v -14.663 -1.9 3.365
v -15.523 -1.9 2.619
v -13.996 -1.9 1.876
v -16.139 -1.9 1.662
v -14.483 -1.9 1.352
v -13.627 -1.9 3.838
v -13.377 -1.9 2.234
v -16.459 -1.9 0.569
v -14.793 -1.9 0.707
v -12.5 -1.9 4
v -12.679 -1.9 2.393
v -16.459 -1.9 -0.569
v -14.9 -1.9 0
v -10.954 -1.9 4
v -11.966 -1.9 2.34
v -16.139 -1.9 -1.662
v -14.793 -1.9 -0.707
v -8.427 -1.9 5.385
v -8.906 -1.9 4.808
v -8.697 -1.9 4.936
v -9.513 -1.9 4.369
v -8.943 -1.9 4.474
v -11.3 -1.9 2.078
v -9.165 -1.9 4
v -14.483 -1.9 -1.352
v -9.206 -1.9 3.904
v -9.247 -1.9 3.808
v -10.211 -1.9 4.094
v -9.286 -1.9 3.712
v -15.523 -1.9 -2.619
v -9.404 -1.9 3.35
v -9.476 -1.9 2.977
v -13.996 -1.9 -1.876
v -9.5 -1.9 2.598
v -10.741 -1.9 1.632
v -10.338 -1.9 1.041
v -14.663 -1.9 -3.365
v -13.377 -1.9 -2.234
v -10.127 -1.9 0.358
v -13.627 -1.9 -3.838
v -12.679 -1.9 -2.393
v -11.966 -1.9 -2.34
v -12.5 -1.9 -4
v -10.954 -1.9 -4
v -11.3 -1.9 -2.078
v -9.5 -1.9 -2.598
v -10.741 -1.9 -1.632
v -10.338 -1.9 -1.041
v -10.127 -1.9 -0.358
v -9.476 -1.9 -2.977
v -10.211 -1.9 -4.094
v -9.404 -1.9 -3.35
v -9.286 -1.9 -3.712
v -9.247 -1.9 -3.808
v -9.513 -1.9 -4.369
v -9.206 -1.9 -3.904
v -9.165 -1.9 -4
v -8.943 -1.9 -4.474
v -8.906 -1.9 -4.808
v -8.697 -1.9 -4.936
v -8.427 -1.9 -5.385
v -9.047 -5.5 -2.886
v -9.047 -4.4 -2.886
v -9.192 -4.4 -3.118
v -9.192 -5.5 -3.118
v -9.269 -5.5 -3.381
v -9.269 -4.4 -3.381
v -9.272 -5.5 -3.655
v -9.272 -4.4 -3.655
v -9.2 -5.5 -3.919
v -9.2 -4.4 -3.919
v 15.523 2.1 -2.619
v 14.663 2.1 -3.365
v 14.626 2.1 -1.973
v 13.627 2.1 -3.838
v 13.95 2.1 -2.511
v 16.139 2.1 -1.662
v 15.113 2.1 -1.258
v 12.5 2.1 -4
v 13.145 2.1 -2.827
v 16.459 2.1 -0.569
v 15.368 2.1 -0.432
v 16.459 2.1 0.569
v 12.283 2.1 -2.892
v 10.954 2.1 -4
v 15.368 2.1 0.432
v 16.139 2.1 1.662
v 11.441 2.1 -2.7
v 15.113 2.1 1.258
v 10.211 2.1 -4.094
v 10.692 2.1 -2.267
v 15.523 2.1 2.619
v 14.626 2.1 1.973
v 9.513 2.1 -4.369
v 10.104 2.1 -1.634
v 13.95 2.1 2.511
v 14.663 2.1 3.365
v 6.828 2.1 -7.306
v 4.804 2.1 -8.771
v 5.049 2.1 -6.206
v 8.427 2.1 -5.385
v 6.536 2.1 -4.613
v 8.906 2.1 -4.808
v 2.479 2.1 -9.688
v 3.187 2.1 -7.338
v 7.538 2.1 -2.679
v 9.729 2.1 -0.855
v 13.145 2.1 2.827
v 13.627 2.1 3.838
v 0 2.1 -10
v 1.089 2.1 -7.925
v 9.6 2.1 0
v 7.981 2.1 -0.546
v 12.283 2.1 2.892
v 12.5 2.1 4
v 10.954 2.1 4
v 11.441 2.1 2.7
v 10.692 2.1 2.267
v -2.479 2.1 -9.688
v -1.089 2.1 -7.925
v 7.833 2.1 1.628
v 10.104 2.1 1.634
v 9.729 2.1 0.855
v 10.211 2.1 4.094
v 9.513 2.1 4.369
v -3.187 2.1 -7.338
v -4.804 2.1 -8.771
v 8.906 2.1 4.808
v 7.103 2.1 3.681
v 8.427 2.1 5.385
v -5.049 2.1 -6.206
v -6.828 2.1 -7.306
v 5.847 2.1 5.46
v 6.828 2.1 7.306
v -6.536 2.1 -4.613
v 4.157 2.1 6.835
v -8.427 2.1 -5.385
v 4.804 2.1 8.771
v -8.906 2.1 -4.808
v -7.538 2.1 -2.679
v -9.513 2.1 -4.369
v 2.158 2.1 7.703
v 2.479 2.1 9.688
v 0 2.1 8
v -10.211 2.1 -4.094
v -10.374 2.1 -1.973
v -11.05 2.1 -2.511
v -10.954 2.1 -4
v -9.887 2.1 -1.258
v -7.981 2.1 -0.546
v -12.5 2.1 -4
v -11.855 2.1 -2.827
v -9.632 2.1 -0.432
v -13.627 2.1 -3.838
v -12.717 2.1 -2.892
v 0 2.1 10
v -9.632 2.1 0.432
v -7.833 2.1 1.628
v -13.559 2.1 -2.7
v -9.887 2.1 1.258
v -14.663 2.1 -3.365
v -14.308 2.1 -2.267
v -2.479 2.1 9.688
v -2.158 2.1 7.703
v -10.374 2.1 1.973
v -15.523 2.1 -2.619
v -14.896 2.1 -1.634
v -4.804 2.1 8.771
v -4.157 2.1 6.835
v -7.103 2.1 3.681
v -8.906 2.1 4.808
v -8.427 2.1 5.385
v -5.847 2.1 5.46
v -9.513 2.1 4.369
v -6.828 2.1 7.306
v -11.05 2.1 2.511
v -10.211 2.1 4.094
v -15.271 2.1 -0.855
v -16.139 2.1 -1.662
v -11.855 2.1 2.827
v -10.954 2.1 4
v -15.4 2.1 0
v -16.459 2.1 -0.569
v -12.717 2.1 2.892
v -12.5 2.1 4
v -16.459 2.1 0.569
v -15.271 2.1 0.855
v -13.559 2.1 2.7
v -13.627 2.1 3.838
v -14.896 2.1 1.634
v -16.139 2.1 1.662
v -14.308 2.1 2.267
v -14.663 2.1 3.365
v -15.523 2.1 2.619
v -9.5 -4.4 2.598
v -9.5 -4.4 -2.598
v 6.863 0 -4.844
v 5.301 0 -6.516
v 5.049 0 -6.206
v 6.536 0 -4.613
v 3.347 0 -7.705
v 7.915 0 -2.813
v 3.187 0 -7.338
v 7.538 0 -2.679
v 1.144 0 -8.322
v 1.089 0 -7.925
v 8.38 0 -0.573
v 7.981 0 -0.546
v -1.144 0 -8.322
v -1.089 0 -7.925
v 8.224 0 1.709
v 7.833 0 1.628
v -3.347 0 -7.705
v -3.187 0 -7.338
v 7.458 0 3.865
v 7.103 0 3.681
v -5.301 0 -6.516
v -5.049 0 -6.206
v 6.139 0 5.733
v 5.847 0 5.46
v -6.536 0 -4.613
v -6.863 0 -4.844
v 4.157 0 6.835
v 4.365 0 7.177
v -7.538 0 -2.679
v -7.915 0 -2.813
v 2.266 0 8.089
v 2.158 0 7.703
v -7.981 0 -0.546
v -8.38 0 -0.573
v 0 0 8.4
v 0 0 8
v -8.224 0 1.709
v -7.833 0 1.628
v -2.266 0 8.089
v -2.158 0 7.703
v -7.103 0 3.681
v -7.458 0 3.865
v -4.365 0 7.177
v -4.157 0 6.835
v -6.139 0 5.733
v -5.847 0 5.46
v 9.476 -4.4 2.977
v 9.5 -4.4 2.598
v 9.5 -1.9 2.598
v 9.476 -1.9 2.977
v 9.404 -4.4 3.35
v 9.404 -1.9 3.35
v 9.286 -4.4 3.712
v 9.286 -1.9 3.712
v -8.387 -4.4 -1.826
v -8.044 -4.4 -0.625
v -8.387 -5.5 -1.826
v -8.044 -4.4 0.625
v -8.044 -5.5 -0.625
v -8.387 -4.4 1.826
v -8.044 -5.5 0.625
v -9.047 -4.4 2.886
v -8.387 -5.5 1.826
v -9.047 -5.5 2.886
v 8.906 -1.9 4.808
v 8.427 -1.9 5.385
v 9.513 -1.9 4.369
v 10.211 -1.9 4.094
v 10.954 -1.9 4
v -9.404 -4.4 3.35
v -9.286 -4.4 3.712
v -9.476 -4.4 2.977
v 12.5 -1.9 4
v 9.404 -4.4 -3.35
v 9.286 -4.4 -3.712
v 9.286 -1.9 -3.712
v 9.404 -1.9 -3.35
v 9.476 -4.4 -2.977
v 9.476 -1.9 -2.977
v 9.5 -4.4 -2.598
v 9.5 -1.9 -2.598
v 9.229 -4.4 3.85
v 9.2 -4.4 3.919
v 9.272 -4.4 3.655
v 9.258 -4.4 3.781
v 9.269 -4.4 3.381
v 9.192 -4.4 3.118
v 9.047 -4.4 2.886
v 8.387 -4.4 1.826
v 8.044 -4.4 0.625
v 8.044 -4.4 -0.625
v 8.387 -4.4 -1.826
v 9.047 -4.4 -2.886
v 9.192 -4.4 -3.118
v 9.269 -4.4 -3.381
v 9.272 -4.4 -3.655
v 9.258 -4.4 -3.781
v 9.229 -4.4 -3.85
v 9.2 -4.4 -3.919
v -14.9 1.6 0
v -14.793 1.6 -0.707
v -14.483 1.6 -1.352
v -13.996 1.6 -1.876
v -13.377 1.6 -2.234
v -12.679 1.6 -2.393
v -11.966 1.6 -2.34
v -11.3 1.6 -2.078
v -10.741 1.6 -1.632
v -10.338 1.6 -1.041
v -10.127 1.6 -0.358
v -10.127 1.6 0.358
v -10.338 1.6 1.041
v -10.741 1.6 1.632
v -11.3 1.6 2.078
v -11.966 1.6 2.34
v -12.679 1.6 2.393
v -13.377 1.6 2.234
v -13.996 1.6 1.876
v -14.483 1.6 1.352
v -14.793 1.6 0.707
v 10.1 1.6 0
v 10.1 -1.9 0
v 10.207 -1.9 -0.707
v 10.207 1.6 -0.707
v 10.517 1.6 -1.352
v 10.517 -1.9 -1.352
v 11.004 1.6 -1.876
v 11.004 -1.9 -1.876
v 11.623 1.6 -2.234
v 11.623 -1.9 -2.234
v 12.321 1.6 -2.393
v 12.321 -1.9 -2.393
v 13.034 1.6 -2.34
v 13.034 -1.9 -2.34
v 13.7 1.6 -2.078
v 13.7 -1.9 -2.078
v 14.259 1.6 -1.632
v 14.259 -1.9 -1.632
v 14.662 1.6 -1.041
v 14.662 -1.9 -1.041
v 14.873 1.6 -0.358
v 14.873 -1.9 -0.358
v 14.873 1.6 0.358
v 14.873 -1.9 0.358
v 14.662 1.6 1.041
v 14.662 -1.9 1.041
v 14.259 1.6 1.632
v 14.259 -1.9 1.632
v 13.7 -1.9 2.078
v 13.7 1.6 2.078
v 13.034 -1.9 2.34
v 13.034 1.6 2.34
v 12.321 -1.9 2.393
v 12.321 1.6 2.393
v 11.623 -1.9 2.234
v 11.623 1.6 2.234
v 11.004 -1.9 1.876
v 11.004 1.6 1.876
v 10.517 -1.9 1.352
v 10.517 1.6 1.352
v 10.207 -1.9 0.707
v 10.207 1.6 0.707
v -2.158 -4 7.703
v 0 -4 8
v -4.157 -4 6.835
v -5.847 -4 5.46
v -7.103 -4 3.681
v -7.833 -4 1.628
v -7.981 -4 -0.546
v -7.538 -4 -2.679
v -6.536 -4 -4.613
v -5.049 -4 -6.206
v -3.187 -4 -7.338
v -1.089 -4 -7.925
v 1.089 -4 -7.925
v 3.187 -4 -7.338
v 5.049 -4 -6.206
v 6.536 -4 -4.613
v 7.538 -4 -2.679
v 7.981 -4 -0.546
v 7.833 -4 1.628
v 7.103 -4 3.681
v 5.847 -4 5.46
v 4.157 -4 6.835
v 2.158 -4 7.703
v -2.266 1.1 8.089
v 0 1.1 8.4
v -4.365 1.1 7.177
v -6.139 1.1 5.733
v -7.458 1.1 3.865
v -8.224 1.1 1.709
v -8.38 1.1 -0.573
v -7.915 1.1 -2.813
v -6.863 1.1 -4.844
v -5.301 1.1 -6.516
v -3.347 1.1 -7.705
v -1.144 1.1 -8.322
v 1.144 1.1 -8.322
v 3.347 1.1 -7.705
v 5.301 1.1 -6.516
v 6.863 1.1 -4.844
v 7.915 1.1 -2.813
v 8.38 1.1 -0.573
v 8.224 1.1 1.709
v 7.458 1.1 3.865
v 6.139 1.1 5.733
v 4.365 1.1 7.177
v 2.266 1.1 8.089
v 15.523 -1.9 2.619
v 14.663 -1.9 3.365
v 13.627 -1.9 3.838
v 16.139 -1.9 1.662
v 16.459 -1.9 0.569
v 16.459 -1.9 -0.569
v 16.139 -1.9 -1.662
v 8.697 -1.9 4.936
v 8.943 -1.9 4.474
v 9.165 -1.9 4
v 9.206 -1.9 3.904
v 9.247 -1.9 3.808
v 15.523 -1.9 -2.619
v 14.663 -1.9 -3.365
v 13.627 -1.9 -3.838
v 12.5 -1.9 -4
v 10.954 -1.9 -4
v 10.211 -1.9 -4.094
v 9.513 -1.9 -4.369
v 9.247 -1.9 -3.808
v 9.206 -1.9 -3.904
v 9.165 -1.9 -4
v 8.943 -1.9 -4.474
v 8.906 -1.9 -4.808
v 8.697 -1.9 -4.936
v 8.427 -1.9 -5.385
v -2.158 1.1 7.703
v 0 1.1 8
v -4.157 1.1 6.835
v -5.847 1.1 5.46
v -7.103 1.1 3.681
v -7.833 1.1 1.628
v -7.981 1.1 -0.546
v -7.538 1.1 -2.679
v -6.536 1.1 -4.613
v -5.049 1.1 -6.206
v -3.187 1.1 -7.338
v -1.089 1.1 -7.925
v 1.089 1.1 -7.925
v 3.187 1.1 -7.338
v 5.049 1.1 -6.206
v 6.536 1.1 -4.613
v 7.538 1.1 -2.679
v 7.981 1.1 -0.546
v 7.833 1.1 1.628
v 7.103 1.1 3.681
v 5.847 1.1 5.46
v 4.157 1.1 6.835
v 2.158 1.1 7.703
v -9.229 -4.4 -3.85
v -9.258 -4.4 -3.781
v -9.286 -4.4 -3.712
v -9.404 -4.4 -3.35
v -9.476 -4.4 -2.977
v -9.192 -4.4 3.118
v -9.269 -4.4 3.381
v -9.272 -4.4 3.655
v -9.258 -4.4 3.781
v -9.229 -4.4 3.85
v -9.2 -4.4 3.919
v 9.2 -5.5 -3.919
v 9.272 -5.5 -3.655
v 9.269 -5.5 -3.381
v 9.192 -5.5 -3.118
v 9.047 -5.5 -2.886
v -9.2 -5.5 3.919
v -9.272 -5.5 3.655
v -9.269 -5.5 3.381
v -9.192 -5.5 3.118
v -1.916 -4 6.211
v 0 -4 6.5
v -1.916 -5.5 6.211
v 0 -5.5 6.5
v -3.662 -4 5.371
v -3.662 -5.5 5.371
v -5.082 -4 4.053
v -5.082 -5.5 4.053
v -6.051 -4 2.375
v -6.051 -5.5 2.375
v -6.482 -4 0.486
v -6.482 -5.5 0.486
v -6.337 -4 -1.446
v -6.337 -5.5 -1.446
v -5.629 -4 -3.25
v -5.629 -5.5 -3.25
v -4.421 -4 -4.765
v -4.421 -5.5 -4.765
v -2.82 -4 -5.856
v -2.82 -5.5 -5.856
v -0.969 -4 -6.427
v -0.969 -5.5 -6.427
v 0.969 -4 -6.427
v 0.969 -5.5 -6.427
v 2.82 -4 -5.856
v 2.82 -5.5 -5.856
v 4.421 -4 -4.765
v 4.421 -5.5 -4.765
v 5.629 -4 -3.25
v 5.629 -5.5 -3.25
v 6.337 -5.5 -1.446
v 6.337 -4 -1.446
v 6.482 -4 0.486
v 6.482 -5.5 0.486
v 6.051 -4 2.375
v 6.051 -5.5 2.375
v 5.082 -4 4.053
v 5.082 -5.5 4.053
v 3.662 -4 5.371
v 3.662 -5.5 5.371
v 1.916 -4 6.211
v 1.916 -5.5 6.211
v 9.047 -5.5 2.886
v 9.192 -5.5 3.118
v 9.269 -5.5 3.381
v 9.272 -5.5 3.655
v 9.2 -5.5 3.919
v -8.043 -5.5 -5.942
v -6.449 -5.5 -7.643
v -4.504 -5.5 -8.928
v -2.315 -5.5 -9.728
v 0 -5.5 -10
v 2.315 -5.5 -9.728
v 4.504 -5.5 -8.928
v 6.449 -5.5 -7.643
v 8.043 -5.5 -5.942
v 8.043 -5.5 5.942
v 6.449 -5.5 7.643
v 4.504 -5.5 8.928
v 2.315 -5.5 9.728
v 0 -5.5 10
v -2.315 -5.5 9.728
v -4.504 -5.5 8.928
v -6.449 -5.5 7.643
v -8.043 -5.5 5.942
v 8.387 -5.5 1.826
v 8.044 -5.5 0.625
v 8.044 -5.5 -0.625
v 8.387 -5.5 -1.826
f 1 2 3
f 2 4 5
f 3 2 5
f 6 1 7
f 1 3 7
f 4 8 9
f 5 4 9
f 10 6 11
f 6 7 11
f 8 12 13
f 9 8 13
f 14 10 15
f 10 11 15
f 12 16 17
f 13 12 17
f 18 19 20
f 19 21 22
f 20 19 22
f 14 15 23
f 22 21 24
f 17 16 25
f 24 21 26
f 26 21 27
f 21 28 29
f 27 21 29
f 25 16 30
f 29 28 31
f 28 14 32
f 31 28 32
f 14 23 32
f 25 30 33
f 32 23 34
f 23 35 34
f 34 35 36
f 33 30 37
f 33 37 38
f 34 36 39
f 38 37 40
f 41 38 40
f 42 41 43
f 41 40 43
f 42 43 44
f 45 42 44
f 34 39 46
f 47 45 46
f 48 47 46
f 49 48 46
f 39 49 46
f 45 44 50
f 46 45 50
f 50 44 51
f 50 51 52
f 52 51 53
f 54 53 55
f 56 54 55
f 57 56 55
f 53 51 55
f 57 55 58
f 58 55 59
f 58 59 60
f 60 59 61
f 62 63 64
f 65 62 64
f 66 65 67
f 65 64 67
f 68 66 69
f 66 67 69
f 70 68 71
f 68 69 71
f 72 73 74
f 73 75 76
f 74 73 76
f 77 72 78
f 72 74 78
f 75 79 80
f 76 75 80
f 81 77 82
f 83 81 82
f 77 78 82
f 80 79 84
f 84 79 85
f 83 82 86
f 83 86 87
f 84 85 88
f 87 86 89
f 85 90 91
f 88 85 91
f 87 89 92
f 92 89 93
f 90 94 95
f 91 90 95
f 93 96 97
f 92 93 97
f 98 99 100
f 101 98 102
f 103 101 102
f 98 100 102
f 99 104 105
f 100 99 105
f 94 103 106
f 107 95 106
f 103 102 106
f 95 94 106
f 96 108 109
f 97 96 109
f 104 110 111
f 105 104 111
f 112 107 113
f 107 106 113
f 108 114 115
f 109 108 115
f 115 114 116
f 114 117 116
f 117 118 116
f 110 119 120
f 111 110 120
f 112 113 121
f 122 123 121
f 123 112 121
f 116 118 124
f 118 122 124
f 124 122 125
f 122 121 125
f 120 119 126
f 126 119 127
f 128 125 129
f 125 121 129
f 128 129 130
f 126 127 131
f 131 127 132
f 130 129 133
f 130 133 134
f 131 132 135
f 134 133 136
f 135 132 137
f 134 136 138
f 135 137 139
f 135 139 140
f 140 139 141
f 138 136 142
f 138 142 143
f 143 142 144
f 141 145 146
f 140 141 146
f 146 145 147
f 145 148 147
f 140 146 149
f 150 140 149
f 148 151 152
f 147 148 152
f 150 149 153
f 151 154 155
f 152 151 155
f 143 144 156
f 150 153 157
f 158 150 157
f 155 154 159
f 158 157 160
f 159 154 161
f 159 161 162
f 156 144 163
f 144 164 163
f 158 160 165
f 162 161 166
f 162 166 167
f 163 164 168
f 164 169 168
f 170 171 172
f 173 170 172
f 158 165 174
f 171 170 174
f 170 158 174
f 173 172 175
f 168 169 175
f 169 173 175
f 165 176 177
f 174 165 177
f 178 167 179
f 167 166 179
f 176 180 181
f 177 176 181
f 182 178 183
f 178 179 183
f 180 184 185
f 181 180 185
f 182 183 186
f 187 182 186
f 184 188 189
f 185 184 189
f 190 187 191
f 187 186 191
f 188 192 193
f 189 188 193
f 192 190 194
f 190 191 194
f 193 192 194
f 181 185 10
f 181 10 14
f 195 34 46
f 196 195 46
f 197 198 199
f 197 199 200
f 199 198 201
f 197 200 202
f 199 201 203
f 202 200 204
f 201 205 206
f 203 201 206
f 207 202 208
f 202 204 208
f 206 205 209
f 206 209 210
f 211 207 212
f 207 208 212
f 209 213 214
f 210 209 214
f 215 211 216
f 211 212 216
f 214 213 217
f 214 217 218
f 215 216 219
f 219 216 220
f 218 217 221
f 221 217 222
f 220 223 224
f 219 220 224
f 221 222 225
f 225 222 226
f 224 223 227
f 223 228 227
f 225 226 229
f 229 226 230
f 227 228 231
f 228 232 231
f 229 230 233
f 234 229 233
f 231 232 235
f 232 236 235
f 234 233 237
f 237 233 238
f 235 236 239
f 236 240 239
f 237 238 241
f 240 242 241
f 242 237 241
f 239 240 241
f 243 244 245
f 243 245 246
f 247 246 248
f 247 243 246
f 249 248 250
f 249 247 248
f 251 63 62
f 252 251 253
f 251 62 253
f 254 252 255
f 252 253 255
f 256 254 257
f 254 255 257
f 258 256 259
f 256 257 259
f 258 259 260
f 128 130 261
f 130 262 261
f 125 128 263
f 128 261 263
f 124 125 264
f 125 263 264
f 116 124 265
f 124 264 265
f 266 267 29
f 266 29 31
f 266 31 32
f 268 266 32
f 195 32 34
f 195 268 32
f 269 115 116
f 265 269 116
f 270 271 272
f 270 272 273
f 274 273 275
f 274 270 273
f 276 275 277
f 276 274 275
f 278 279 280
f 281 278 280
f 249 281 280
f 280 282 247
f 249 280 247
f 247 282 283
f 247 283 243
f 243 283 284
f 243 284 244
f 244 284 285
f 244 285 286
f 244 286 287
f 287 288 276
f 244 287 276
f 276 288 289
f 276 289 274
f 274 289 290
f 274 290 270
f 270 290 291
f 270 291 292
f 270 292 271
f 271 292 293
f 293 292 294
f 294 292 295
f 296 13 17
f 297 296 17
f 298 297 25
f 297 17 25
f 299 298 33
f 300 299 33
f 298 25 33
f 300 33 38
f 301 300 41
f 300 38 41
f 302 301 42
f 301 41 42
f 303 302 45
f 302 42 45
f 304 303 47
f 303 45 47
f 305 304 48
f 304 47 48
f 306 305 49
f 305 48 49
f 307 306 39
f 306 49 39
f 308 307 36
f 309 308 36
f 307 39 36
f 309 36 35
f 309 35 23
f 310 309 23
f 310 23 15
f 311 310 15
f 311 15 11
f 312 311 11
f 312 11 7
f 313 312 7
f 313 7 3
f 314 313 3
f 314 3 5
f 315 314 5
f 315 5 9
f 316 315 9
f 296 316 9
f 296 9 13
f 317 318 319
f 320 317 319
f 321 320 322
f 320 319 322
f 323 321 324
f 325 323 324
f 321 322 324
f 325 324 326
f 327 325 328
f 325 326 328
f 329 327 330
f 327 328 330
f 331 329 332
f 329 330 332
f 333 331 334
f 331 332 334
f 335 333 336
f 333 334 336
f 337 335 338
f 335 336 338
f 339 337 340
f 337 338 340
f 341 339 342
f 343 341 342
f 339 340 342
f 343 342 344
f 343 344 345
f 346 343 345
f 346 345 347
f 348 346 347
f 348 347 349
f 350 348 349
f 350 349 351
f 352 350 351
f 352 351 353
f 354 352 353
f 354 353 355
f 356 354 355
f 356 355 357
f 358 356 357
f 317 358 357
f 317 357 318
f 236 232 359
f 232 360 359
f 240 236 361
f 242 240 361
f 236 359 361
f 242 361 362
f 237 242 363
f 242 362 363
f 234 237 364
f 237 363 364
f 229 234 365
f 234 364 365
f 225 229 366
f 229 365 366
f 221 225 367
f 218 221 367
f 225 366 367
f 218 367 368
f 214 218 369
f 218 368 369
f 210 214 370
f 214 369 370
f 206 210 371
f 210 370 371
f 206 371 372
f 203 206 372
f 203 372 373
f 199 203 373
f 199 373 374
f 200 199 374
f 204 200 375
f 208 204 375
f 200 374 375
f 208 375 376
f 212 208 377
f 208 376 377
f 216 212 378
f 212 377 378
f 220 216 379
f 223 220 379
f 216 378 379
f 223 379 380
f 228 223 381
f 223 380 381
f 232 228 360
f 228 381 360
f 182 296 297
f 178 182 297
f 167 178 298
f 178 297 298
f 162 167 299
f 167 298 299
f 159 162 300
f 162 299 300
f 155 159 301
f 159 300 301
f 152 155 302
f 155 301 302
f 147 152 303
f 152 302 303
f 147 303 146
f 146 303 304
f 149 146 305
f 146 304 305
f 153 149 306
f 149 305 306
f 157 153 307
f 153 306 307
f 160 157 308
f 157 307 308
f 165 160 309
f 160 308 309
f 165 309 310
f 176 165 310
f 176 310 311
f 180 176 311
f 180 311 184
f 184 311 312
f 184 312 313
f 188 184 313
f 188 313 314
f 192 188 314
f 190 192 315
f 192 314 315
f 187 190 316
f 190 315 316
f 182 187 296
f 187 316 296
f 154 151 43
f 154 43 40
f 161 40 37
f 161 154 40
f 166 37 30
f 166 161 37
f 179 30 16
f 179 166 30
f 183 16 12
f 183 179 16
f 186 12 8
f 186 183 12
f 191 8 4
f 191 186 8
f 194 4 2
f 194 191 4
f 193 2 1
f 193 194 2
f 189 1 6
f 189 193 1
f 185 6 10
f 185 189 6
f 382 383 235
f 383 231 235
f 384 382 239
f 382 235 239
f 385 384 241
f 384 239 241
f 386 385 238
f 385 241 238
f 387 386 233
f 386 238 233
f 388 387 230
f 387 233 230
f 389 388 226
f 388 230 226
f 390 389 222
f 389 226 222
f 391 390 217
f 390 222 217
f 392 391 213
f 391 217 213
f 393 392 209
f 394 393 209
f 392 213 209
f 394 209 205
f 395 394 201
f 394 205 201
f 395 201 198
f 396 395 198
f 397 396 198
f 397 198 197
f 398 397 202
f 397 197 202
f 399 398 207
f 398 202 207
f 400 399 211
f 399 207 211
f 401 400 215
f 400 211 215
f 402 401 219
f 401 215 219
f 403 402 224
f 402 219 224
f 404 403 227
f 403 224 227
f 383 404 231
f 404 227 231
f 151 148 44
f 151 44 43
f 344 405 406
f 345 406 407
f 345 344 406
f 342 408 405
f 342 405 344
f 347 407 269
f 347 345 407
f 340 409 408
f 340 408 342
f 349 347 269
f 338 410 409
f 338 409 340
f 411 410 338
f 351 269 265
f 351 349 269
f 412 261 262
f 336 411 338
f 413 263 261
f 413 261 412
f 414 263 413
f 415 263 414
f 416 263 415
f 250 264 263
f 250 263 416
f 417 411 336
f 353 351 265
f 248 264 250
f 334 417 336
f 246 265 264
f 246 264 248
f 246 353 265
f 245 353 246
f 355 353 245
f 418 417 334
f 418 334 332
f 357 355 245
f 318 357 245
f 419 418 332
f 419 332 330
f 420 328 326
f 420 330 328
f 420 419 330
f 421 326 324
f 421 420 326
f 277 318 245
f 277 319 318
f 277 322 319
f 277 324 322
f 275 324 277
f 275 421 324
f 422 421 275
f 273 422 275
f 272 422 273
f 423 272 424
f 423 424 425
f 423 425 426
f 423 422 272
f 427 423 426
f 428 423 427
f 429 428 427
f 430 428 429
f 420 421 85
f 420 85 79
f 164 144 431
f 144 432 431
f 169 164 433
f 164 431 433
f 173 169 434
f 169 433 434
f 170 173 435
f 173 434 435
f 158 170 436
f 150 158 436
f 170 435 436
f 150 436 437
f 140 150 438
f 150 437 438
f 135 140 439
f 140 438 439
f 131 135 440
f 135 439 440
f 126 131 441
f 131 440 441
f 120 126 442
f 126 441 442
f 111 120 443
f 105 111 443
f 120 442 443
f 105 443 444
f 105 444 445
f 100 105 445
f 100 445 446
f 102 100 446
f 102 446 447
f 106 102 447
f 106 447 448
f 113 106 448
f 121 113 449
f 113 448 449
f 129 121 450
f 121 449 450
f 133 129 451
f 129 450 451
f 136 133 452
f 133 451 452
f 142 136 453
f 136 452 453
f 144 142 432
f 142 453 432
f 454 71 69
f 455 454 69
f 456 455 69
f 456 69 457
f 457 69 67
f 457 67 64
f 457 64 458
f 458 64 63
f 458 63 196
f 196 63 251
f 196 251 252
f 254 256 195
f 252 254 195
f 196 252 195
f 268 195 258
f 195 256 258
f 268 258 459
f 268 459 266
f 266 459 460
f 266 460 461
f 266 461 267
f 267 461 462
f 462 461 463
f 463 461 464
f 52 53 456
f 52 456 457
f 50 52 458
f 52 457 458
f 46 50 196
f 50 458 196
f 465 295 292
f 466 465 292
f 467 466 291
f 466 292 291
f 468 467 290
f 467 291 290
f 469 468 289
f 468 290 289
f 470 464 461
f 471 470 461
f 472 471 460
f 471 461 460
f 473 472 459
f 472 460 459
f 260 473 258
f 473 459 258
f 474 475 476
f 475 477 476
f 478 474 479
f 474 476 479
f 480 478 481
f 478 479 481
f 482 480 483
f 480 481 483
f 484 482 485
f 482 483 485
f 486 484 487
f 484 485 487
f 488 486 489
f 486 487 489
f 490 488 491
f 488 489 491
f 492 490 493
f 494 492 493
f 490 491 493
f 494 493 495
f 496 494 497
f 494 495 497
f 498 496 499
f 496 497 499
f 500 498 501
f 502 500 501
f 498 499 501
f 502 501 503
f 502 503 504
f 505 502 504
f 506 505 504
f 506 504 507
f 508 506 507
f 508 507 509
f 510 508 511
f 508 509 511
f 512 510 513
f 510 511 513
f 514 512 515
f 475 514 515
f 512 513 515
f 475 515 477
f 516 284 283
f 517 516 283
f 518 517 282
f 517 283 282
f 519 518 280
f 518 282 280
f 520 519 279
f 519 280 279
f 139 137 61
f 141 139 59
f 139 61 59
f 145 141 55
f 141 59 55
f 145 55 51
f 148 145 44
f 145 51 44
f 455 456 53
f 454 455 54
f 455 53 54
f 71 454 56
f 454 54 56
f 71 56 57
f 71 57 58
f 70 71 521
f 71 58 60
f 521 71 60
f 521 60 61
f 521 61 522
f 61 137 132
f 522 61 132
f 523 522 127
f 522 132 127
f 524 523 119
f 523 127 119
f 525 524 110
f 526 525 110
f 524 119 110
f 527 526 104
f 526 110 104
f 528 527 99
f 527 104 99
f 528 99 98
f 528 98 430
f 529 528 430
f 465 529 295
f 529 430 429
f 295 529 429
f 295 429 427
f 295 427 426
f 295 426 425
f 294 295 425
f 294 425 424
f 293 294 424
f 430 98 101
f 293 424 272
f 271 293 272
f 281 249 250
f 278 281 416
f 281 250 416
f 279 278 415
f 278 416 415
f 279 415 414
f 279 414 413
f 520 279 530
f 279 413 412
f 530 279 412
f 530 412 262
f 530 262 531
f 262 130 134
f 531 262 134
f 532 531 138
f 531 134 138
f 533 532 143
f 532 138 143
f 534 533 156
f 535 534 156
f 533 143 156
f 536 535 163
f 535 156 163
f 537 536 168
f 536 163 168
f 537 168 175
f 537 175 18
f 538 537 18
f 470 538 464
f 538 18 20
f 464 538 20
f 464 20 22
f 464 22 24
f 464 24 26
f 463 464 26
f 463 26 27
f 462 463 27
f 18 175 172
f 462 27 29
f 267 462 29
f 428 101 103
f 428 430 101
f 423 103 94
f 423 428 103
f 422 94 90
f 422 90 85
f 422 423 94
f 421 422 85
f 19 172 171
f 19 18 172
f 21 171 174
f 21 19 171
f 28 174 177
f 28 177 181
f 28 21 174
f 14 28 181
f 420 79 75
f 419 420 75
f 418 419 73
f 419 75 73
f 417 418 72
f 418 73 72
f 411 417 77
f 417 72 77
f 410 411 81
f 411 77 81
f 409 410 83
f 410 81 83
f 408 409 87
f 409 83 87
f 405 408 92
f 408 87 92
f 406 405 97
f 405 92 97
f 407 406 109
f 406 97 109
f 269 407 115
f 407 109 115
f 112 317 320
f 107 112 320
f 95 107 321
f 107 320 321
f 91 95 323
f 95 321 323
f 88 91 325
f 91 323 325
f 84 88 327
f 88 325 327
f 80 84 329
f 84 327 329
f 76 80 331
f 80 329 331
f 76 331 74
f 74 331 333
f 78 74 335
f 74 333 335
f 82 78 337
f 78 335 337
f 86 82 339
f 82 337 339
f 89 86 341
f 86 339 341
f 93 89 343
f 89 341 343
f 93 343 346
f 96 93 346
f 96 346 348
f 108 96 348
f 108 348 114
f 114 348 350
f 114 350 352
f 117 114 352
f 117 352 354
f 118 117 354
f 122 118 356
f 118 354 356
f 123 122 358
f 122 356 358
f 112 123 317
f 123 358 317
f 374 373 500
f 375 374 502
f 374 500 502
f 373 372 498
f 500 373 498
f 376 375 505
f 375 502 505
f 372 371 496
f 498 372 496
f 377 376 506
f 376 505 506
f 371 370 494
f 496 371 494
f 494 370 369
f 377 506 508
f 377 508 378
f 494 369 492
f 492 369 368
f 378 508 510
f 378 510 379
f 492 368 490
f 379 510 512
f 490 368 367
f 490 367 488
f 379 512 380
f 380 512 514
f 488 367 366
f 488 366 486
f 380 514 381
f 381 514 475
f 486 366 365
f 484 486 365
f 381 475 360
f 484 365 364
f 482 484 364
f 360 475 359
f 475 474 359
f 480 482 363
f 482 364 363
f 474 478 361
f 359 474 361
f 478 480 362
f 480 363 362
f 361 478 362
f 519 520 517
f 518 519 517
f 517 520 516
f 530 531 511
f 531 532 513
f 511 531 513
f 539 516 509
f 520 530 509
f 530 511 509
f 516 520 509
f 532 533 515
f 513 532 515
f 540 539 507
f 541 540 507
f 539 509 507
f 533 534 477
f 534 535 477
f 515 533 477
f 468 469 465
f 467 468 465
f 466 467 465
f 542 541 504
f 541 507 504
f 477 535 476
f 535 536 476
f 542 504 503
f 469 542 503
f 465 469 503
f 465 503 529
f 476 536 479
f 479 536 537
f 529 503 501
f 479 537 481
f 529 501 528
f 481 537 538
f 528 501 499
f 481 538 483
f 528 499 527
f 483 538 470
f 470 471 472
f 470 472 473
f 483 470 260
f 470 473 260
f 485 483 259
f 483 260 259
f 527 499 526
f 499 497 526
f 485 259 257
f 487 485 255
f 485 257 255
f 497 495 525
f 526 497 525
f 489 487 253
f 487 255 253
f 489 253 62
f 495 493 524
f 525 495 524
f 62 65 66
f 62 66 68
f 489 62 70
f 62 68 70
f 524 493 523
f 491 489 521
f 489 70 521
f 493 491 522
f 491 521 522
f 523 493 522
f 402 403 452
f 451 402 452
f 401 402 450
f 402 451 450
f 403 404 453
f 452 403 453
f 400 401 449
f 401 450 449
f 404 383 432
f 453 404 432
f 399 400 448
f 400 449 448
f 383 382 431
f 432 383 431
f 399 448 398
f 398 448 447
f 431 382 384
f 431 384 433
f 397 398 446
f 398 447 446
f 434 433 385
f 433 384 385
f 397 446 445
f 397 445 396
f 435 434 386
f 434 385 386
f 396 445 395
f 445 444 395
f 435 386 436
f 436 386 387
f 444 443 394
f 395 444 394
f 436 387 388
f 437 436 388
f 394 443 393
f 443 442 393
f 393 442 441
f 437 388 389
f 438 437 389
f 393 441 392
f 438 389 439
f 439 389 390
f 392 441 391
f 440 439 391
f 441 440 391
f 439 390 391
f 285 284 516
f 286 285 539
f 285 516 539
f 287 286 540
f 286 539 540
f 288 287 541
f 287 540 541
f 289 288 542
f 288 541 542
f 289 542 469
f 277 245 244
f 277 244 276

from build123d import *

# Parameters (mm, degrees)
BOSS_EXTRU_1_DEPTH             = 4
ENL_V_START                    = -4
ENL_V_MAT_EXTRU_3_DEPTH        = 3.6
CONG_2_R                       = 3
CONG_3_R                       = 3
CONG_2_OF_SYM_TRIE1_R          = 3
CONG_3_OF_SYM_TRIE1_R          = 3
F_4_8_4_8_DIAMETER_HOLE2_D     = 4.8
F_4_8_4_8_DIAMETER_HOLE2_DEPTH = 6.4
F_4_8_4_8_DIAMETER_HOLE2_TIP   = 1.442065486
CHANFREIN1_SIZE                = 0.5
ESQUISSE9_R                    = 4.5
ENL_V_MAT_EXTRU_4_DEPTH        = 1.1
CONG_4_R                       = 1


with BuildPart() as part:
    # Esquisse1 → Révolution1 (revolve)
    with BuildSketch(Plane.XY, mode=Mode.PRIVATE) as r_volution1_sk:
        Polygon((-6.5, -4), (-6.5, -5.5), (-10, -5.5), (-10, 2.1), (-8, 2.1), (-8, 1.1), (-8.4, 1.1), (-8.4, 0), (-8, 0), (-8, -4), align=None)
    revolve(r_volution1_sk.sketch.rotate(Axis((0, 6.608552154, 0), (0, -1, 0)), 270), axis=Axis((0, 6.608552154, 0), (0, -1, 0)))

    # Esquisse2 → Boss.-Extru.1 (add)
    with BuildSketch(Plane(origin=(0, 2.1, 0), x_dir=(1, 0, 0), z_dir=(0, 1, 0))):
        with BuildLine():
            Line((-12.5, -4), (-9.16515139, -4))
            ThreePointArc((-9.16515139, -4), (-10, 0), (-9.16515139, 4))
            Line((-9.16515139, 4), (-12.5, 4))
            ThreePointArc((-12.5, 4), (-16.5, 0), (-12.5, -4))
        make_face()
    boss_extru_1 = extrude(amount=-BOSS_EXTRU_1_DEPTH)

    # Esquisse2<6> → Enlèv. mat.-Extru.3 (cut)
    with BuildSketch(Plane(origin=(0, 2.1, 0), x_dir=(1, 0, 0), z_dir=(0, 1, 0)).offset(ENL_V_START)):
        with BuildLine():
            ThreePointArc((-9.5, 3.122498999), (-10, 0), (-9.5, -3.122498999))
            Line((-9.5, -3.122498999), (-9.5, 3.122498999))
        make_face()
    enl_v_mat_extru_3 = extrude(amount=-ENL_V_MAT_EXTRU_3_DEPTH, mode=Mode.SUBTRACT)

    # Congé2
    cong_2_edges = [part.edges().sort_by_distance(p)[0] for p in [
        (-9.5, -3.7, 3.122498999),
        (-9.5, -3.7, -3.122498999),
    ]]
    fillet(cong_2_edges, radius=CONG_2_R)

    # Congé3
    cong_3_edges = [part.edges().sort_by_distance(p)[0] for p in [
        (-9.16515139, 0.1, -4),
        (-9.16515139, 0.1, 4),
    ]]
    fillet(cong_3_edges, radius=CONG_3_R)

    # Symétrie1: Boss.-Extru.1, Enlèv. mat.-Extru.3 across plane
    add(boss_extru_1.mirror(Plane(origin=(0, 0, 0), x_dir=(0, 0, 1), z_dir=(1, 0, 0))))
    add(enl_v_mat_extru_3.mirror(Plane(origin=(0, 0, 0), x_dir=(0, 0, 1), z_dir=(1, 0, 0))), mode=Mode.SUBTRACT)

    # Congé2 of Symétrie1
    cong_2_of_sym_trie1_edges = [part.edges().sort_by_distance(p)[0] for p in [
        (9.5, -3.7, 3.122498999),
        (9.5, -3.7, -3.122498999),
    ]]
    fillet(cong_2_of_sym_trie1_edges, radius=CONG_2_OF_SYM_TRIE1_R)

    # Congé3 of Symétrie1
    cong_3_of_sym_trie1_edges = [part.edges().sort_by_distance(p)[0] for p in [
        (9.16515139, 0.1, -4),
        (9.16515139, 0.1, 4),
    ]]
    fillet(cong_3_of_sym_trie1_edges, radius=CONG_3_OF_SYM_TRIE1_R)

    # Ø4.8 (4.8) Diameter Hole2
    with Locations(Plane(origin=(0, 2.1, 0), x_dir=(1, 0, 0), z_dir=(0, 1, 0))):
        with Locations((-12.5, 0), (12.5, 0)):
            Hole(F_4_8_4_8_DIAMETER_HOLE2_D / 2, depth=F_4_8_4_8_DIAMETER_HOLE2_DEPTH)
            with Locations((0, 0, -(F_4_8_4_8_DIAMETER_HOLE2_DEPTH + F_4_8_4_8_DIAMETER_HOLE2_TIP / 2))):  # 118° drill point
                Cone(0, F_4_8_4_8_DIAMETER_HOLE2_D / 2, F_4_8_4_8_DIAMETER_HOLE2_TIP, mode=Mode.SUBTRACT)

    # Chanfrein1
    chanfrein1_edges = [part.edges().sort_by_distance(p)[0] for p in [
        (14.9, 2.1, 0),
        (-10.1, 2.1, 0),
    ]]
    chamfer(chanfrein1_edges, length=CHANFREIN1_SIZE)

    # Esquisse9 → Enlèv. mat.-Extru.4 (cut)
    with BuildSketch(Plane.XZ.offset(5.5)):
        with Locations((-12.5, 0)):
            Circle(ESQUISSE9_R)
        with Locations((12.5, 0)):
            Circle(ESQUISSE9_R)
    extrude(amount=-ENL_V_MAT_EXTRU_4_DEPTH, mode=Mode.SUBTRACT)

    # Congé4
    # the kernel refuses this fillet: 1 mm, written as the material it takes off along each edge
    with BuildSketch(Plane(origin=(9.421052632, -4.4, 3.281780477), x_dir=(-0.686560042836171, 0, -0.7270731102033653), z_dir=(0, -1, 0))) as cong_4_piece_1:
        with BuildLine():
            CenterArc((0.604915781, -0.998168708), CONG_4_R, 93.468029374, 62.964308211)
            Line((-0.311672758, -0.598336932), (-0.403331612, -0.558353754))
            ThreePointArc((-0.403331612, -0.558353754), (-0.310284429, -0.351422835), (-0.083419367, 0.05514716))
            Line((-0.083419367, 0.05514716), (0.006049158, 0.099816871))
            ThreePointArc((0.006049158, 0.099816871), (0.272212102, 0.091759185), (0.538375045, 0.099816871))
            Line((0.538375045, 0.099816871), (0.544424203, 0))
        make_face()
    extrude(amount=2.786614567, mode=Mode.SUBTRACT)
    with BuildSketch(Plane(origin=(9.421052632, -4.4, -3.281780477), x_dir=(-0.6865600428361709, 0, 0.7270731102033654), z_dir=(0, -1, 0)), Plane(origin=(-9.421052632, -4.4, 3.281780477), x_dir=(0.6865600428361707, 0, -0.7270731102033658), z_dir=(0, -1, 0))) as cong_4_piece_2:
        with BuildLine():
            CenterArc((0.604915781, 0.998168708), CONG_4_R, 203.567662416, 62.964308211)
            Line((-0.311672758, 0.598336932), (-0.403331612, 0.558353754))
            ThreePointArc((-0.403331612, 0.558353754), (-0.310284429, 0.351422835), (-0.083419367, -0.05514716))
            Line((-0.083419367, -0.05514716), (0.006049158, -0.099816871))
            ThreePointArc((0.006049158, -0.099816871), (0.272212102, -0.091759185), (0.538375045, -0.099816871))
            Line((0.538375045, -0.099816871), (0.544424203, 0))
        make_face()
    extrude(amount=2.786614567, mode=Mode.SUBTRACT)
    with BuildSketch(Plane(origin=(-9.421052632, -4.4, -3.281780477), x_dir=(0.3276573021844398, 0, -0.9447966407249841), z_dir=(0, -1, 0))) as cong_4_piece_3:
        with BuildLine():
            CenterArc((0.605807396, 0.997627822), CONG_4_R, 210.982965052, 62.964308211)
            Line((-0.251512996, 0.482844619), (-0.337245035, 0.431366299))
            ThreePointArc((-0.337245035, 0.431366299), (-0.207136841, 0.199031418), (-0.091321217, -0.04074844))
            Line((-0.091321217, -0.04074844), (-0.010371424, -0.099460714))
            ThreePointArc((-0.010371424, -0.099460714), (0.455018696, -0.112838034), (0.68152967, -0.099762782))
            Line((0.68152967, -0.099762782), (0.674645827, 0))
        make_face()
    extrude(amount=2.786614567, mode=Mode.SUBTRACT)


solid = part.part
